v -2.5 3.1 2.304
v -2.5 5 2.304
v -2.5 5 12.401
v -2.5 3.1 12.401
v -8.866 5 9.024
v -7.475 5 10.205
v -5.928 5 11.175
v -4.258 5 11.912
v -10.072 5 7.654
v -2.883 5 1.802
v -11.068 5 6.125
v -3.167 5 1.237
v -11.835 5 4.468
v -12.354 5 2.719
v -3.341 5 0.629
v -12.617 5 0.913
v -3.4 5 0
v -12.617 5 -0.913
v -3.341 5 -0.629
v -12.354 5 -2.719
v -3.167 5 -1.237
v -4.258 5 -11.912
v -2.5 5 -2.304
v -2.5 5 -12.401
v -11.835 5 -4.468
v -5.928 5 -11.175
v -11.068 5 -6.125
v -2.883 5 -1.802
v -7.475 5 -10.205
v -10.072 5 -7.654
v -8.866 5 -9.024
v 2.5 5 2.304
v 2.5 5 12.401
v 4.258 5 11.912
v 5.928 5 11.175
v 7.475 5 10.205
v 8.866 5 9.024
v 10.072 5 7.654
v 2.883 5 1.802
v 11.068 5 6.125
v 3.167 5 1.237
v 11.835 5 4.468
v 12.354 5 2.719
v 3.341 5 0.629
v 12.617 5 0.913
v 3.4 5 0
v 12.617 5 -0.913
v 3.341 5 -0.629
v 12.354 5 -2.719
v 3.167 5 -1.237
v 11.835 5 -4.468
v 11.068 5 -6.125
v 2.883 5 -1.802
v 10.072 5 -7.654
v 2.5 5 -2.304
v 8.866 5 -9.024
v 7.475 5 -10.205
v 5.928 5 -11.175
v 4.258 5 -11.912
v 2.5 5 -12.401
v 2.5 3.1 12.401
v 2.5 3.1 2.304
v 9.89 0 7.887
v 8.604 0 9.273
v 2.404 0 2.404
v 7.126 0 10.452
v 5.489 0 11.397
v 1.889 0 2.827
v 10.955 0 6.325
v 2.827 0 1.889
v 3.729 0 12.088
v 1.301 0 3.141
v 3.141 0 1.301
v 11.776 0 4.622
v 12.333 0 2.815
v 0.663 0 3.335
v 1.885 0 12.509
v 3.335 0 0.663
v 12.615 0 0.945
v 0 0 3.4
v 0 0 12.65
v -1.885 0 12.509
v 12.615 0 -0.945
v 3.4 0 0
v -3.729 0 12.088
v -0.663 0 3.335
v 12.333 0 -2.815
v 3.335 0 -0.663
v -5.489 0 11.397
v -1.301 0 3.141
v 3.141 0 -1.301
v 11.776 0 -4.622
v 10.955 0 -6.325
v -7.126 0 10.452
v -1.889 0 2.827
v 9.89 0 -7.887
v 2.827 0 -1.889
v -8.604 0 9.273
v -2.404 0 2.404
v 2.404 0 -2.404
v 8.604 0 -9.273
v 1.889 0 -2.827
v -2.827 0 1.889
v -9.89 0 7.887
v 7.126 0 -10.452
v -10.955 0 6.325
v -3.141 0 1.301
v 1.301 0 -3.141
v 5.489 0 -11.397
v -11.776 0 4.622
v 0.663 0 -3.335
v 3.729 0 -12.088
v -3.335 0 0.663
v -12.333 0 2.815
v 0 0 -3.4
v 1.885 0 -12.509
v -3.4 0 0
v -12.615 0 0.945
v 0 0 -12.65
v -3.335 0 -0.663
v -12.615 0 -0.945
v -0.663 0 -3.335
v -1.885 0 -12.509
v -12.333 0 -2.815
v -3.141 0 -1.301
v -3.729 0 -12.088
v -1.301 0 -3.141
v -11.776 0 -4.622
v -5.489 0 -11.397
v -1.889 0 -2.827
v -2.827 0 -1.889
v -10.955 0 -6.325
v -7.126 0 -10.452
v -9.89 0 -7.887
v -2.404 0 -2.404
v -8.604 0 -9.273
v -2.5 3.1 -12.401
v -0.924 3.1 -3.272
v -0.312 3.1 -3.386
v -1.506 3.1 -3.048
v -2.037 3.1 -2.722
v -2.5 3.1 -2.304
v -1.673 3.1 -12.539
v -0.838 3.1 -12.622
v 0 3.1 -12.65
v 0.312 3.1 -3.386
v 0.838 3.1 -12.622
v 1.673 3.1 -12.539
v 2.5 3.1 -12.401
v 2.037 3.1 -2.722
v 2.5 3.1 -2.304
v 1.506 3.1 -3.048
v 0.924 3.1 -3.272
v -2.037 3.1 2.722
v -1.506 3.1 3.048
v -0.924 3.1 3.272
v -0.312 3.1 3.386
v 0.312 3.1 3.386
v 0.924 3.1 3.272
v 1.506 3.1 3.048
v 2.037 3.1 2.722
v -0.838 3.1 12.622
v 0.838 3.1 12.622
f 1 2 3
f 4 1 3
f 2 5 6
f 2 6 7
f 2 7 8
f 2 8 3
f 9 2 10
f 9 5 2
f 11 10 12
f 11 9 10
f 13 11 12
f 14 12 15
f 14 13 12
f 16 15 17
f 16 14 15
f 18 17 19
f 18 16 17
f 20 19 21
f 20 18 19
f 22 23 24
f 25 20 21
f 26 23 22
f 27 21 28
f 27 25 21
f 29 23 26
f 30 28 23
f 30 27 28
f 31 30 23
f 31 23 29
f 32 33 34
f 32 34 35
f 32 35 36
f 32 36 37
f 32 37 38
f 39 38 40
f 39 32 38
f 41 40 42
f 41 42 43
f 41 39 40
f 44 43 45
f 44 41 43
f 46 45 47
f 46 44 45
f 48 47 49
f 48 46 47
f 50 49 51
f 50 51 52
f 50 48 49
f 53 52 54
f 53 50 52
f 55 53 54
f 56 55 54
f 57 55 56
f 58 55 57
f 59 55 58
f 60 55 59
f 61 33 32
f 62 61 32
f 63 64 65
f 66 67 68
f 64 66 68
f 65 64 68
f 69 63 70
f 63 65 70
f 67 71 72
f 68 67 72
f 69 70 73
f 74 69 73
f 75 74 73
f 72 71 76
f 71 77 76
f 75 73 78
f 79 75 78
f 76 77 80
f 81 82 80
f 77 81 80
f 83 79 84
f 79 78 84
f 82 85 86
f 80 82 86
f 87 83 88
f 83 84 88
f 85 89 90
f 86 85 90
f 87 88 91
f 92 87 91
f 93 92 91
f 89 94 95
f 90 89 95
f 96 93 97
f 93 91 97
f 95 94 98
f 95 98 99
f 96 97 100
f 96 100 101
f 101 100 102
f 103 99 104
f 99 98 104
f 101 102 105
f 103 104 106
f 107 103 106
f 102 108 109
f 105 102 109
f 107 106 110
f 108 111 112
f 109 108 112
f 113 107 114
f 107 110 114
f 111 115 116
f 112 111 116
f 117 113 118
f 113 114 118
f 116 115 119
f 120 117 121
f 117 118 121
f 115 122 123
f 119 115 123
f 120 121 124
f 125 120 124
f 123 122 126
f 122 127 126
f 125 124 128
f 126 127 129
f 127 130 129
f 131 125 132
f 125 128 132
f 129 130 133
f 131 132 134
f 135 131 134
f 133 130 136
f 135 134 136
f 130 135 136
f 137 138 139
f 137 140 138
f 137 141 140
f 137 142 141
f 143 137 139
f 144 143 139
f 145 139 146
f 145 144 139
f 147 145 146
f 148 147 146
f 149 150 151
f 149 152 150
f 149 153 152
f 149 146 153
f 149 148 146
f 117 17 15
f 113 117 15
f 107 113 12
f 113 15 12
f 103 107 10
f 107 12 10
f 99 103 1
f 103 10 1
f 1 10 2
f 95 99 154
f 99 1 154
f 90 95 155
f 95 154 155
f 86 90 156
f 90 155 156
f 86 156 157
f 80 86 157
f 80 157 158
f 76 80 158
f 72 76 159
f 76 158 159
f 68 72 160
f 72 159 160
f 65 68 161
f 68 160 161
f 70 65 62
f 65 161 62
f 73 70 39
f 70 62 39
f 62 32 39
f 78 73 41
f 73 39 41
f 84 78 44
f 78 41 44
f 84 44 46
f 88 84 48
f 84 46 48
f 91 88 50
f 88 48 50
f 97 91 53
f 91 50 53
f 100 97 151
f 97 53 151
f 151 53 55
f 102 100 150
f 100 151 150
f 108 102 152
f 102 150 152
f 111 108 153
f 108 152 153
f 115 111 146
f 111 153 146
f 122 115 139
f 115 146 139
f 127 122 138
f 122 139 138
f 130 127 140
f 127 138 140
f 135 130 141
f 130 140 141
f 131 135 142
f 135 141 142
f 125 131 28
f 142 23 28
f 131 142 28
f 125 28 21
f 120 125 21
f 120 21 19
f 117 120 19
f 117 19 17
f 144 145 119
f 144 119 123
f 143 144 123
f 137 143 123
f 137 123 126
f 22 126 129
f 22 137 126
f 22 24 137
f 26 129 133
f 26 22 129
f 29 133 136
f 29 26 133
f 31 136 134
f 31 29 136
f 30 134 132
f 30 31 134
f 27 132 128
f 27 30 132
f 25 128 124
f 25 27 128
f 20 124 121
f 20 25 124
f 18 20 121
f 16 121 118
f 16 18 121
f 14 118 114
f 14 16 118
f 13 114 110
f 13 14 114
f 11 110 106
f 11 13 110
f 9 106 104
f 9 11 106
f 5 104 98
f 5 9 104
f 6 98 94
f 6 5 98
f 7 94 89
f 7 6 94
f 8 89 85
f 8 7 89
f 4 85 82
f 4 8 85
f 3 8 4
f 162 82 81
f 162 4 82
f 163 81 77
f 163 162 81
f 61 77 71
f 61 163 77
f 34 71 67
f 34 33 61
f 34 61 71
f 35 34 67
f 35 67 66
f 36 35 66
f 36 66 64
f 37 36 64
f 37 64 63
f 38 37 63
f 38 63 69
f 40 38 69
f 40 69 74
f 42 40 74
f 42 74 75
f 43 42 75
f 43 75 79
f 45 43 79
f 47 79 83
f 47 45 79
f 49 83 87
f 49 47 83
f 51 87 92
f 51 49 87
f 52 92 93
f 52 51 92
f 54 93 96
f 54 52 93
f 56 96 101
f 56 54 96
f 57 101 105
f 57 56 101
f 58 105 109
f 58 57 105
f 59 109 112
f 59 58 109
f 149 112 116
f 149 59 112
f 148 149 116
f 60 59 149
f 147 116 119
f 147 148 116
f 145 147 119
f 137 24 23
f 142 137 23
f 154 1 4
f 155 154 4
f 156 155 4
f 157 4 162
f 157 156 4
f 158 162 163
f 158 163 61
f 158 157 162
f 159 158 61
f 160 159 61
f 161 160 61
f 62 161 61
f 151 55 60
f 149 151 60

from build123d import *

# Parameters (mm, degrees)
ESQUISSE1_W             = 10.15
ESQUISSE1_H             = 5
ENL_V_MAT_EXTRU_1_DEPTH = 1.9
TROU_TARAUD_M81_D       = 6.8
TROU_TARAUD_M81_DEPTH   = 22.25
TROU_TARAUD_M81_TIP     = 2.042926105


with BuildPart() as part:
    # Esquisse1 → Révolution1 (revolve)
    with BuildSketch(Plane.XY, mode=Mode.PRIVATE) as r_volution1_sk:
        with Locations((-7.575, 2.5)):
            Rectangle(ESQUISSE1_W, ESQUISSE1_H)
    revolve(r_volution1_sk.sketch.rotate(Axis((0, 0, 0), (0, 1, 0)), 270), axis=Axis((0, 0, 0), (0, 1, 0)))

    # Esquisse2 → Enlèv. mat.-Extru.1 (cut)
    with BuildSketch(Plane(origin=(0, 5, 0), x_dir=(1, 0, 0), z_dir=(0, 1, 0))):
        with BuildLine():
            Line((-2.5, 12.400504022), (-2.5, -12.400504022))
            ThreePointArc((-2.5, -12.400504022), (0, -12.65), (2.5, -12.400504022))
            Line((2.5, -12.400504022), (2.5, 12.400504022))
            ThreePointArc((2.5, 12.400504022), (0, 12.65), (-2.5, 12.400504022))
        make_face()
    extrude(amount=-ENL_V_MAT_EXTRU_1_DEPTH, mode=Mode.SUBTRACT)

    # Trou taraudé M81
    with Locations(Plane.XZ):
        with Locations((0, 0)):
            Hole(TROU_TARAUD_M81_D / 2, depth=TROU_TARAUD_M81_DEPTH)
            with Locations((0, 0, -(TROU_TARAUD_M81_DEPTH + TROU_TARAUD_M81_TIP / 2))):  # 118° drill point
                Cone(0, TROU_TARAUD_M81_D / 2, TROU_TARAUD_M81_TIP, mode=Mode.SUBTRACT)


solid = part.part
